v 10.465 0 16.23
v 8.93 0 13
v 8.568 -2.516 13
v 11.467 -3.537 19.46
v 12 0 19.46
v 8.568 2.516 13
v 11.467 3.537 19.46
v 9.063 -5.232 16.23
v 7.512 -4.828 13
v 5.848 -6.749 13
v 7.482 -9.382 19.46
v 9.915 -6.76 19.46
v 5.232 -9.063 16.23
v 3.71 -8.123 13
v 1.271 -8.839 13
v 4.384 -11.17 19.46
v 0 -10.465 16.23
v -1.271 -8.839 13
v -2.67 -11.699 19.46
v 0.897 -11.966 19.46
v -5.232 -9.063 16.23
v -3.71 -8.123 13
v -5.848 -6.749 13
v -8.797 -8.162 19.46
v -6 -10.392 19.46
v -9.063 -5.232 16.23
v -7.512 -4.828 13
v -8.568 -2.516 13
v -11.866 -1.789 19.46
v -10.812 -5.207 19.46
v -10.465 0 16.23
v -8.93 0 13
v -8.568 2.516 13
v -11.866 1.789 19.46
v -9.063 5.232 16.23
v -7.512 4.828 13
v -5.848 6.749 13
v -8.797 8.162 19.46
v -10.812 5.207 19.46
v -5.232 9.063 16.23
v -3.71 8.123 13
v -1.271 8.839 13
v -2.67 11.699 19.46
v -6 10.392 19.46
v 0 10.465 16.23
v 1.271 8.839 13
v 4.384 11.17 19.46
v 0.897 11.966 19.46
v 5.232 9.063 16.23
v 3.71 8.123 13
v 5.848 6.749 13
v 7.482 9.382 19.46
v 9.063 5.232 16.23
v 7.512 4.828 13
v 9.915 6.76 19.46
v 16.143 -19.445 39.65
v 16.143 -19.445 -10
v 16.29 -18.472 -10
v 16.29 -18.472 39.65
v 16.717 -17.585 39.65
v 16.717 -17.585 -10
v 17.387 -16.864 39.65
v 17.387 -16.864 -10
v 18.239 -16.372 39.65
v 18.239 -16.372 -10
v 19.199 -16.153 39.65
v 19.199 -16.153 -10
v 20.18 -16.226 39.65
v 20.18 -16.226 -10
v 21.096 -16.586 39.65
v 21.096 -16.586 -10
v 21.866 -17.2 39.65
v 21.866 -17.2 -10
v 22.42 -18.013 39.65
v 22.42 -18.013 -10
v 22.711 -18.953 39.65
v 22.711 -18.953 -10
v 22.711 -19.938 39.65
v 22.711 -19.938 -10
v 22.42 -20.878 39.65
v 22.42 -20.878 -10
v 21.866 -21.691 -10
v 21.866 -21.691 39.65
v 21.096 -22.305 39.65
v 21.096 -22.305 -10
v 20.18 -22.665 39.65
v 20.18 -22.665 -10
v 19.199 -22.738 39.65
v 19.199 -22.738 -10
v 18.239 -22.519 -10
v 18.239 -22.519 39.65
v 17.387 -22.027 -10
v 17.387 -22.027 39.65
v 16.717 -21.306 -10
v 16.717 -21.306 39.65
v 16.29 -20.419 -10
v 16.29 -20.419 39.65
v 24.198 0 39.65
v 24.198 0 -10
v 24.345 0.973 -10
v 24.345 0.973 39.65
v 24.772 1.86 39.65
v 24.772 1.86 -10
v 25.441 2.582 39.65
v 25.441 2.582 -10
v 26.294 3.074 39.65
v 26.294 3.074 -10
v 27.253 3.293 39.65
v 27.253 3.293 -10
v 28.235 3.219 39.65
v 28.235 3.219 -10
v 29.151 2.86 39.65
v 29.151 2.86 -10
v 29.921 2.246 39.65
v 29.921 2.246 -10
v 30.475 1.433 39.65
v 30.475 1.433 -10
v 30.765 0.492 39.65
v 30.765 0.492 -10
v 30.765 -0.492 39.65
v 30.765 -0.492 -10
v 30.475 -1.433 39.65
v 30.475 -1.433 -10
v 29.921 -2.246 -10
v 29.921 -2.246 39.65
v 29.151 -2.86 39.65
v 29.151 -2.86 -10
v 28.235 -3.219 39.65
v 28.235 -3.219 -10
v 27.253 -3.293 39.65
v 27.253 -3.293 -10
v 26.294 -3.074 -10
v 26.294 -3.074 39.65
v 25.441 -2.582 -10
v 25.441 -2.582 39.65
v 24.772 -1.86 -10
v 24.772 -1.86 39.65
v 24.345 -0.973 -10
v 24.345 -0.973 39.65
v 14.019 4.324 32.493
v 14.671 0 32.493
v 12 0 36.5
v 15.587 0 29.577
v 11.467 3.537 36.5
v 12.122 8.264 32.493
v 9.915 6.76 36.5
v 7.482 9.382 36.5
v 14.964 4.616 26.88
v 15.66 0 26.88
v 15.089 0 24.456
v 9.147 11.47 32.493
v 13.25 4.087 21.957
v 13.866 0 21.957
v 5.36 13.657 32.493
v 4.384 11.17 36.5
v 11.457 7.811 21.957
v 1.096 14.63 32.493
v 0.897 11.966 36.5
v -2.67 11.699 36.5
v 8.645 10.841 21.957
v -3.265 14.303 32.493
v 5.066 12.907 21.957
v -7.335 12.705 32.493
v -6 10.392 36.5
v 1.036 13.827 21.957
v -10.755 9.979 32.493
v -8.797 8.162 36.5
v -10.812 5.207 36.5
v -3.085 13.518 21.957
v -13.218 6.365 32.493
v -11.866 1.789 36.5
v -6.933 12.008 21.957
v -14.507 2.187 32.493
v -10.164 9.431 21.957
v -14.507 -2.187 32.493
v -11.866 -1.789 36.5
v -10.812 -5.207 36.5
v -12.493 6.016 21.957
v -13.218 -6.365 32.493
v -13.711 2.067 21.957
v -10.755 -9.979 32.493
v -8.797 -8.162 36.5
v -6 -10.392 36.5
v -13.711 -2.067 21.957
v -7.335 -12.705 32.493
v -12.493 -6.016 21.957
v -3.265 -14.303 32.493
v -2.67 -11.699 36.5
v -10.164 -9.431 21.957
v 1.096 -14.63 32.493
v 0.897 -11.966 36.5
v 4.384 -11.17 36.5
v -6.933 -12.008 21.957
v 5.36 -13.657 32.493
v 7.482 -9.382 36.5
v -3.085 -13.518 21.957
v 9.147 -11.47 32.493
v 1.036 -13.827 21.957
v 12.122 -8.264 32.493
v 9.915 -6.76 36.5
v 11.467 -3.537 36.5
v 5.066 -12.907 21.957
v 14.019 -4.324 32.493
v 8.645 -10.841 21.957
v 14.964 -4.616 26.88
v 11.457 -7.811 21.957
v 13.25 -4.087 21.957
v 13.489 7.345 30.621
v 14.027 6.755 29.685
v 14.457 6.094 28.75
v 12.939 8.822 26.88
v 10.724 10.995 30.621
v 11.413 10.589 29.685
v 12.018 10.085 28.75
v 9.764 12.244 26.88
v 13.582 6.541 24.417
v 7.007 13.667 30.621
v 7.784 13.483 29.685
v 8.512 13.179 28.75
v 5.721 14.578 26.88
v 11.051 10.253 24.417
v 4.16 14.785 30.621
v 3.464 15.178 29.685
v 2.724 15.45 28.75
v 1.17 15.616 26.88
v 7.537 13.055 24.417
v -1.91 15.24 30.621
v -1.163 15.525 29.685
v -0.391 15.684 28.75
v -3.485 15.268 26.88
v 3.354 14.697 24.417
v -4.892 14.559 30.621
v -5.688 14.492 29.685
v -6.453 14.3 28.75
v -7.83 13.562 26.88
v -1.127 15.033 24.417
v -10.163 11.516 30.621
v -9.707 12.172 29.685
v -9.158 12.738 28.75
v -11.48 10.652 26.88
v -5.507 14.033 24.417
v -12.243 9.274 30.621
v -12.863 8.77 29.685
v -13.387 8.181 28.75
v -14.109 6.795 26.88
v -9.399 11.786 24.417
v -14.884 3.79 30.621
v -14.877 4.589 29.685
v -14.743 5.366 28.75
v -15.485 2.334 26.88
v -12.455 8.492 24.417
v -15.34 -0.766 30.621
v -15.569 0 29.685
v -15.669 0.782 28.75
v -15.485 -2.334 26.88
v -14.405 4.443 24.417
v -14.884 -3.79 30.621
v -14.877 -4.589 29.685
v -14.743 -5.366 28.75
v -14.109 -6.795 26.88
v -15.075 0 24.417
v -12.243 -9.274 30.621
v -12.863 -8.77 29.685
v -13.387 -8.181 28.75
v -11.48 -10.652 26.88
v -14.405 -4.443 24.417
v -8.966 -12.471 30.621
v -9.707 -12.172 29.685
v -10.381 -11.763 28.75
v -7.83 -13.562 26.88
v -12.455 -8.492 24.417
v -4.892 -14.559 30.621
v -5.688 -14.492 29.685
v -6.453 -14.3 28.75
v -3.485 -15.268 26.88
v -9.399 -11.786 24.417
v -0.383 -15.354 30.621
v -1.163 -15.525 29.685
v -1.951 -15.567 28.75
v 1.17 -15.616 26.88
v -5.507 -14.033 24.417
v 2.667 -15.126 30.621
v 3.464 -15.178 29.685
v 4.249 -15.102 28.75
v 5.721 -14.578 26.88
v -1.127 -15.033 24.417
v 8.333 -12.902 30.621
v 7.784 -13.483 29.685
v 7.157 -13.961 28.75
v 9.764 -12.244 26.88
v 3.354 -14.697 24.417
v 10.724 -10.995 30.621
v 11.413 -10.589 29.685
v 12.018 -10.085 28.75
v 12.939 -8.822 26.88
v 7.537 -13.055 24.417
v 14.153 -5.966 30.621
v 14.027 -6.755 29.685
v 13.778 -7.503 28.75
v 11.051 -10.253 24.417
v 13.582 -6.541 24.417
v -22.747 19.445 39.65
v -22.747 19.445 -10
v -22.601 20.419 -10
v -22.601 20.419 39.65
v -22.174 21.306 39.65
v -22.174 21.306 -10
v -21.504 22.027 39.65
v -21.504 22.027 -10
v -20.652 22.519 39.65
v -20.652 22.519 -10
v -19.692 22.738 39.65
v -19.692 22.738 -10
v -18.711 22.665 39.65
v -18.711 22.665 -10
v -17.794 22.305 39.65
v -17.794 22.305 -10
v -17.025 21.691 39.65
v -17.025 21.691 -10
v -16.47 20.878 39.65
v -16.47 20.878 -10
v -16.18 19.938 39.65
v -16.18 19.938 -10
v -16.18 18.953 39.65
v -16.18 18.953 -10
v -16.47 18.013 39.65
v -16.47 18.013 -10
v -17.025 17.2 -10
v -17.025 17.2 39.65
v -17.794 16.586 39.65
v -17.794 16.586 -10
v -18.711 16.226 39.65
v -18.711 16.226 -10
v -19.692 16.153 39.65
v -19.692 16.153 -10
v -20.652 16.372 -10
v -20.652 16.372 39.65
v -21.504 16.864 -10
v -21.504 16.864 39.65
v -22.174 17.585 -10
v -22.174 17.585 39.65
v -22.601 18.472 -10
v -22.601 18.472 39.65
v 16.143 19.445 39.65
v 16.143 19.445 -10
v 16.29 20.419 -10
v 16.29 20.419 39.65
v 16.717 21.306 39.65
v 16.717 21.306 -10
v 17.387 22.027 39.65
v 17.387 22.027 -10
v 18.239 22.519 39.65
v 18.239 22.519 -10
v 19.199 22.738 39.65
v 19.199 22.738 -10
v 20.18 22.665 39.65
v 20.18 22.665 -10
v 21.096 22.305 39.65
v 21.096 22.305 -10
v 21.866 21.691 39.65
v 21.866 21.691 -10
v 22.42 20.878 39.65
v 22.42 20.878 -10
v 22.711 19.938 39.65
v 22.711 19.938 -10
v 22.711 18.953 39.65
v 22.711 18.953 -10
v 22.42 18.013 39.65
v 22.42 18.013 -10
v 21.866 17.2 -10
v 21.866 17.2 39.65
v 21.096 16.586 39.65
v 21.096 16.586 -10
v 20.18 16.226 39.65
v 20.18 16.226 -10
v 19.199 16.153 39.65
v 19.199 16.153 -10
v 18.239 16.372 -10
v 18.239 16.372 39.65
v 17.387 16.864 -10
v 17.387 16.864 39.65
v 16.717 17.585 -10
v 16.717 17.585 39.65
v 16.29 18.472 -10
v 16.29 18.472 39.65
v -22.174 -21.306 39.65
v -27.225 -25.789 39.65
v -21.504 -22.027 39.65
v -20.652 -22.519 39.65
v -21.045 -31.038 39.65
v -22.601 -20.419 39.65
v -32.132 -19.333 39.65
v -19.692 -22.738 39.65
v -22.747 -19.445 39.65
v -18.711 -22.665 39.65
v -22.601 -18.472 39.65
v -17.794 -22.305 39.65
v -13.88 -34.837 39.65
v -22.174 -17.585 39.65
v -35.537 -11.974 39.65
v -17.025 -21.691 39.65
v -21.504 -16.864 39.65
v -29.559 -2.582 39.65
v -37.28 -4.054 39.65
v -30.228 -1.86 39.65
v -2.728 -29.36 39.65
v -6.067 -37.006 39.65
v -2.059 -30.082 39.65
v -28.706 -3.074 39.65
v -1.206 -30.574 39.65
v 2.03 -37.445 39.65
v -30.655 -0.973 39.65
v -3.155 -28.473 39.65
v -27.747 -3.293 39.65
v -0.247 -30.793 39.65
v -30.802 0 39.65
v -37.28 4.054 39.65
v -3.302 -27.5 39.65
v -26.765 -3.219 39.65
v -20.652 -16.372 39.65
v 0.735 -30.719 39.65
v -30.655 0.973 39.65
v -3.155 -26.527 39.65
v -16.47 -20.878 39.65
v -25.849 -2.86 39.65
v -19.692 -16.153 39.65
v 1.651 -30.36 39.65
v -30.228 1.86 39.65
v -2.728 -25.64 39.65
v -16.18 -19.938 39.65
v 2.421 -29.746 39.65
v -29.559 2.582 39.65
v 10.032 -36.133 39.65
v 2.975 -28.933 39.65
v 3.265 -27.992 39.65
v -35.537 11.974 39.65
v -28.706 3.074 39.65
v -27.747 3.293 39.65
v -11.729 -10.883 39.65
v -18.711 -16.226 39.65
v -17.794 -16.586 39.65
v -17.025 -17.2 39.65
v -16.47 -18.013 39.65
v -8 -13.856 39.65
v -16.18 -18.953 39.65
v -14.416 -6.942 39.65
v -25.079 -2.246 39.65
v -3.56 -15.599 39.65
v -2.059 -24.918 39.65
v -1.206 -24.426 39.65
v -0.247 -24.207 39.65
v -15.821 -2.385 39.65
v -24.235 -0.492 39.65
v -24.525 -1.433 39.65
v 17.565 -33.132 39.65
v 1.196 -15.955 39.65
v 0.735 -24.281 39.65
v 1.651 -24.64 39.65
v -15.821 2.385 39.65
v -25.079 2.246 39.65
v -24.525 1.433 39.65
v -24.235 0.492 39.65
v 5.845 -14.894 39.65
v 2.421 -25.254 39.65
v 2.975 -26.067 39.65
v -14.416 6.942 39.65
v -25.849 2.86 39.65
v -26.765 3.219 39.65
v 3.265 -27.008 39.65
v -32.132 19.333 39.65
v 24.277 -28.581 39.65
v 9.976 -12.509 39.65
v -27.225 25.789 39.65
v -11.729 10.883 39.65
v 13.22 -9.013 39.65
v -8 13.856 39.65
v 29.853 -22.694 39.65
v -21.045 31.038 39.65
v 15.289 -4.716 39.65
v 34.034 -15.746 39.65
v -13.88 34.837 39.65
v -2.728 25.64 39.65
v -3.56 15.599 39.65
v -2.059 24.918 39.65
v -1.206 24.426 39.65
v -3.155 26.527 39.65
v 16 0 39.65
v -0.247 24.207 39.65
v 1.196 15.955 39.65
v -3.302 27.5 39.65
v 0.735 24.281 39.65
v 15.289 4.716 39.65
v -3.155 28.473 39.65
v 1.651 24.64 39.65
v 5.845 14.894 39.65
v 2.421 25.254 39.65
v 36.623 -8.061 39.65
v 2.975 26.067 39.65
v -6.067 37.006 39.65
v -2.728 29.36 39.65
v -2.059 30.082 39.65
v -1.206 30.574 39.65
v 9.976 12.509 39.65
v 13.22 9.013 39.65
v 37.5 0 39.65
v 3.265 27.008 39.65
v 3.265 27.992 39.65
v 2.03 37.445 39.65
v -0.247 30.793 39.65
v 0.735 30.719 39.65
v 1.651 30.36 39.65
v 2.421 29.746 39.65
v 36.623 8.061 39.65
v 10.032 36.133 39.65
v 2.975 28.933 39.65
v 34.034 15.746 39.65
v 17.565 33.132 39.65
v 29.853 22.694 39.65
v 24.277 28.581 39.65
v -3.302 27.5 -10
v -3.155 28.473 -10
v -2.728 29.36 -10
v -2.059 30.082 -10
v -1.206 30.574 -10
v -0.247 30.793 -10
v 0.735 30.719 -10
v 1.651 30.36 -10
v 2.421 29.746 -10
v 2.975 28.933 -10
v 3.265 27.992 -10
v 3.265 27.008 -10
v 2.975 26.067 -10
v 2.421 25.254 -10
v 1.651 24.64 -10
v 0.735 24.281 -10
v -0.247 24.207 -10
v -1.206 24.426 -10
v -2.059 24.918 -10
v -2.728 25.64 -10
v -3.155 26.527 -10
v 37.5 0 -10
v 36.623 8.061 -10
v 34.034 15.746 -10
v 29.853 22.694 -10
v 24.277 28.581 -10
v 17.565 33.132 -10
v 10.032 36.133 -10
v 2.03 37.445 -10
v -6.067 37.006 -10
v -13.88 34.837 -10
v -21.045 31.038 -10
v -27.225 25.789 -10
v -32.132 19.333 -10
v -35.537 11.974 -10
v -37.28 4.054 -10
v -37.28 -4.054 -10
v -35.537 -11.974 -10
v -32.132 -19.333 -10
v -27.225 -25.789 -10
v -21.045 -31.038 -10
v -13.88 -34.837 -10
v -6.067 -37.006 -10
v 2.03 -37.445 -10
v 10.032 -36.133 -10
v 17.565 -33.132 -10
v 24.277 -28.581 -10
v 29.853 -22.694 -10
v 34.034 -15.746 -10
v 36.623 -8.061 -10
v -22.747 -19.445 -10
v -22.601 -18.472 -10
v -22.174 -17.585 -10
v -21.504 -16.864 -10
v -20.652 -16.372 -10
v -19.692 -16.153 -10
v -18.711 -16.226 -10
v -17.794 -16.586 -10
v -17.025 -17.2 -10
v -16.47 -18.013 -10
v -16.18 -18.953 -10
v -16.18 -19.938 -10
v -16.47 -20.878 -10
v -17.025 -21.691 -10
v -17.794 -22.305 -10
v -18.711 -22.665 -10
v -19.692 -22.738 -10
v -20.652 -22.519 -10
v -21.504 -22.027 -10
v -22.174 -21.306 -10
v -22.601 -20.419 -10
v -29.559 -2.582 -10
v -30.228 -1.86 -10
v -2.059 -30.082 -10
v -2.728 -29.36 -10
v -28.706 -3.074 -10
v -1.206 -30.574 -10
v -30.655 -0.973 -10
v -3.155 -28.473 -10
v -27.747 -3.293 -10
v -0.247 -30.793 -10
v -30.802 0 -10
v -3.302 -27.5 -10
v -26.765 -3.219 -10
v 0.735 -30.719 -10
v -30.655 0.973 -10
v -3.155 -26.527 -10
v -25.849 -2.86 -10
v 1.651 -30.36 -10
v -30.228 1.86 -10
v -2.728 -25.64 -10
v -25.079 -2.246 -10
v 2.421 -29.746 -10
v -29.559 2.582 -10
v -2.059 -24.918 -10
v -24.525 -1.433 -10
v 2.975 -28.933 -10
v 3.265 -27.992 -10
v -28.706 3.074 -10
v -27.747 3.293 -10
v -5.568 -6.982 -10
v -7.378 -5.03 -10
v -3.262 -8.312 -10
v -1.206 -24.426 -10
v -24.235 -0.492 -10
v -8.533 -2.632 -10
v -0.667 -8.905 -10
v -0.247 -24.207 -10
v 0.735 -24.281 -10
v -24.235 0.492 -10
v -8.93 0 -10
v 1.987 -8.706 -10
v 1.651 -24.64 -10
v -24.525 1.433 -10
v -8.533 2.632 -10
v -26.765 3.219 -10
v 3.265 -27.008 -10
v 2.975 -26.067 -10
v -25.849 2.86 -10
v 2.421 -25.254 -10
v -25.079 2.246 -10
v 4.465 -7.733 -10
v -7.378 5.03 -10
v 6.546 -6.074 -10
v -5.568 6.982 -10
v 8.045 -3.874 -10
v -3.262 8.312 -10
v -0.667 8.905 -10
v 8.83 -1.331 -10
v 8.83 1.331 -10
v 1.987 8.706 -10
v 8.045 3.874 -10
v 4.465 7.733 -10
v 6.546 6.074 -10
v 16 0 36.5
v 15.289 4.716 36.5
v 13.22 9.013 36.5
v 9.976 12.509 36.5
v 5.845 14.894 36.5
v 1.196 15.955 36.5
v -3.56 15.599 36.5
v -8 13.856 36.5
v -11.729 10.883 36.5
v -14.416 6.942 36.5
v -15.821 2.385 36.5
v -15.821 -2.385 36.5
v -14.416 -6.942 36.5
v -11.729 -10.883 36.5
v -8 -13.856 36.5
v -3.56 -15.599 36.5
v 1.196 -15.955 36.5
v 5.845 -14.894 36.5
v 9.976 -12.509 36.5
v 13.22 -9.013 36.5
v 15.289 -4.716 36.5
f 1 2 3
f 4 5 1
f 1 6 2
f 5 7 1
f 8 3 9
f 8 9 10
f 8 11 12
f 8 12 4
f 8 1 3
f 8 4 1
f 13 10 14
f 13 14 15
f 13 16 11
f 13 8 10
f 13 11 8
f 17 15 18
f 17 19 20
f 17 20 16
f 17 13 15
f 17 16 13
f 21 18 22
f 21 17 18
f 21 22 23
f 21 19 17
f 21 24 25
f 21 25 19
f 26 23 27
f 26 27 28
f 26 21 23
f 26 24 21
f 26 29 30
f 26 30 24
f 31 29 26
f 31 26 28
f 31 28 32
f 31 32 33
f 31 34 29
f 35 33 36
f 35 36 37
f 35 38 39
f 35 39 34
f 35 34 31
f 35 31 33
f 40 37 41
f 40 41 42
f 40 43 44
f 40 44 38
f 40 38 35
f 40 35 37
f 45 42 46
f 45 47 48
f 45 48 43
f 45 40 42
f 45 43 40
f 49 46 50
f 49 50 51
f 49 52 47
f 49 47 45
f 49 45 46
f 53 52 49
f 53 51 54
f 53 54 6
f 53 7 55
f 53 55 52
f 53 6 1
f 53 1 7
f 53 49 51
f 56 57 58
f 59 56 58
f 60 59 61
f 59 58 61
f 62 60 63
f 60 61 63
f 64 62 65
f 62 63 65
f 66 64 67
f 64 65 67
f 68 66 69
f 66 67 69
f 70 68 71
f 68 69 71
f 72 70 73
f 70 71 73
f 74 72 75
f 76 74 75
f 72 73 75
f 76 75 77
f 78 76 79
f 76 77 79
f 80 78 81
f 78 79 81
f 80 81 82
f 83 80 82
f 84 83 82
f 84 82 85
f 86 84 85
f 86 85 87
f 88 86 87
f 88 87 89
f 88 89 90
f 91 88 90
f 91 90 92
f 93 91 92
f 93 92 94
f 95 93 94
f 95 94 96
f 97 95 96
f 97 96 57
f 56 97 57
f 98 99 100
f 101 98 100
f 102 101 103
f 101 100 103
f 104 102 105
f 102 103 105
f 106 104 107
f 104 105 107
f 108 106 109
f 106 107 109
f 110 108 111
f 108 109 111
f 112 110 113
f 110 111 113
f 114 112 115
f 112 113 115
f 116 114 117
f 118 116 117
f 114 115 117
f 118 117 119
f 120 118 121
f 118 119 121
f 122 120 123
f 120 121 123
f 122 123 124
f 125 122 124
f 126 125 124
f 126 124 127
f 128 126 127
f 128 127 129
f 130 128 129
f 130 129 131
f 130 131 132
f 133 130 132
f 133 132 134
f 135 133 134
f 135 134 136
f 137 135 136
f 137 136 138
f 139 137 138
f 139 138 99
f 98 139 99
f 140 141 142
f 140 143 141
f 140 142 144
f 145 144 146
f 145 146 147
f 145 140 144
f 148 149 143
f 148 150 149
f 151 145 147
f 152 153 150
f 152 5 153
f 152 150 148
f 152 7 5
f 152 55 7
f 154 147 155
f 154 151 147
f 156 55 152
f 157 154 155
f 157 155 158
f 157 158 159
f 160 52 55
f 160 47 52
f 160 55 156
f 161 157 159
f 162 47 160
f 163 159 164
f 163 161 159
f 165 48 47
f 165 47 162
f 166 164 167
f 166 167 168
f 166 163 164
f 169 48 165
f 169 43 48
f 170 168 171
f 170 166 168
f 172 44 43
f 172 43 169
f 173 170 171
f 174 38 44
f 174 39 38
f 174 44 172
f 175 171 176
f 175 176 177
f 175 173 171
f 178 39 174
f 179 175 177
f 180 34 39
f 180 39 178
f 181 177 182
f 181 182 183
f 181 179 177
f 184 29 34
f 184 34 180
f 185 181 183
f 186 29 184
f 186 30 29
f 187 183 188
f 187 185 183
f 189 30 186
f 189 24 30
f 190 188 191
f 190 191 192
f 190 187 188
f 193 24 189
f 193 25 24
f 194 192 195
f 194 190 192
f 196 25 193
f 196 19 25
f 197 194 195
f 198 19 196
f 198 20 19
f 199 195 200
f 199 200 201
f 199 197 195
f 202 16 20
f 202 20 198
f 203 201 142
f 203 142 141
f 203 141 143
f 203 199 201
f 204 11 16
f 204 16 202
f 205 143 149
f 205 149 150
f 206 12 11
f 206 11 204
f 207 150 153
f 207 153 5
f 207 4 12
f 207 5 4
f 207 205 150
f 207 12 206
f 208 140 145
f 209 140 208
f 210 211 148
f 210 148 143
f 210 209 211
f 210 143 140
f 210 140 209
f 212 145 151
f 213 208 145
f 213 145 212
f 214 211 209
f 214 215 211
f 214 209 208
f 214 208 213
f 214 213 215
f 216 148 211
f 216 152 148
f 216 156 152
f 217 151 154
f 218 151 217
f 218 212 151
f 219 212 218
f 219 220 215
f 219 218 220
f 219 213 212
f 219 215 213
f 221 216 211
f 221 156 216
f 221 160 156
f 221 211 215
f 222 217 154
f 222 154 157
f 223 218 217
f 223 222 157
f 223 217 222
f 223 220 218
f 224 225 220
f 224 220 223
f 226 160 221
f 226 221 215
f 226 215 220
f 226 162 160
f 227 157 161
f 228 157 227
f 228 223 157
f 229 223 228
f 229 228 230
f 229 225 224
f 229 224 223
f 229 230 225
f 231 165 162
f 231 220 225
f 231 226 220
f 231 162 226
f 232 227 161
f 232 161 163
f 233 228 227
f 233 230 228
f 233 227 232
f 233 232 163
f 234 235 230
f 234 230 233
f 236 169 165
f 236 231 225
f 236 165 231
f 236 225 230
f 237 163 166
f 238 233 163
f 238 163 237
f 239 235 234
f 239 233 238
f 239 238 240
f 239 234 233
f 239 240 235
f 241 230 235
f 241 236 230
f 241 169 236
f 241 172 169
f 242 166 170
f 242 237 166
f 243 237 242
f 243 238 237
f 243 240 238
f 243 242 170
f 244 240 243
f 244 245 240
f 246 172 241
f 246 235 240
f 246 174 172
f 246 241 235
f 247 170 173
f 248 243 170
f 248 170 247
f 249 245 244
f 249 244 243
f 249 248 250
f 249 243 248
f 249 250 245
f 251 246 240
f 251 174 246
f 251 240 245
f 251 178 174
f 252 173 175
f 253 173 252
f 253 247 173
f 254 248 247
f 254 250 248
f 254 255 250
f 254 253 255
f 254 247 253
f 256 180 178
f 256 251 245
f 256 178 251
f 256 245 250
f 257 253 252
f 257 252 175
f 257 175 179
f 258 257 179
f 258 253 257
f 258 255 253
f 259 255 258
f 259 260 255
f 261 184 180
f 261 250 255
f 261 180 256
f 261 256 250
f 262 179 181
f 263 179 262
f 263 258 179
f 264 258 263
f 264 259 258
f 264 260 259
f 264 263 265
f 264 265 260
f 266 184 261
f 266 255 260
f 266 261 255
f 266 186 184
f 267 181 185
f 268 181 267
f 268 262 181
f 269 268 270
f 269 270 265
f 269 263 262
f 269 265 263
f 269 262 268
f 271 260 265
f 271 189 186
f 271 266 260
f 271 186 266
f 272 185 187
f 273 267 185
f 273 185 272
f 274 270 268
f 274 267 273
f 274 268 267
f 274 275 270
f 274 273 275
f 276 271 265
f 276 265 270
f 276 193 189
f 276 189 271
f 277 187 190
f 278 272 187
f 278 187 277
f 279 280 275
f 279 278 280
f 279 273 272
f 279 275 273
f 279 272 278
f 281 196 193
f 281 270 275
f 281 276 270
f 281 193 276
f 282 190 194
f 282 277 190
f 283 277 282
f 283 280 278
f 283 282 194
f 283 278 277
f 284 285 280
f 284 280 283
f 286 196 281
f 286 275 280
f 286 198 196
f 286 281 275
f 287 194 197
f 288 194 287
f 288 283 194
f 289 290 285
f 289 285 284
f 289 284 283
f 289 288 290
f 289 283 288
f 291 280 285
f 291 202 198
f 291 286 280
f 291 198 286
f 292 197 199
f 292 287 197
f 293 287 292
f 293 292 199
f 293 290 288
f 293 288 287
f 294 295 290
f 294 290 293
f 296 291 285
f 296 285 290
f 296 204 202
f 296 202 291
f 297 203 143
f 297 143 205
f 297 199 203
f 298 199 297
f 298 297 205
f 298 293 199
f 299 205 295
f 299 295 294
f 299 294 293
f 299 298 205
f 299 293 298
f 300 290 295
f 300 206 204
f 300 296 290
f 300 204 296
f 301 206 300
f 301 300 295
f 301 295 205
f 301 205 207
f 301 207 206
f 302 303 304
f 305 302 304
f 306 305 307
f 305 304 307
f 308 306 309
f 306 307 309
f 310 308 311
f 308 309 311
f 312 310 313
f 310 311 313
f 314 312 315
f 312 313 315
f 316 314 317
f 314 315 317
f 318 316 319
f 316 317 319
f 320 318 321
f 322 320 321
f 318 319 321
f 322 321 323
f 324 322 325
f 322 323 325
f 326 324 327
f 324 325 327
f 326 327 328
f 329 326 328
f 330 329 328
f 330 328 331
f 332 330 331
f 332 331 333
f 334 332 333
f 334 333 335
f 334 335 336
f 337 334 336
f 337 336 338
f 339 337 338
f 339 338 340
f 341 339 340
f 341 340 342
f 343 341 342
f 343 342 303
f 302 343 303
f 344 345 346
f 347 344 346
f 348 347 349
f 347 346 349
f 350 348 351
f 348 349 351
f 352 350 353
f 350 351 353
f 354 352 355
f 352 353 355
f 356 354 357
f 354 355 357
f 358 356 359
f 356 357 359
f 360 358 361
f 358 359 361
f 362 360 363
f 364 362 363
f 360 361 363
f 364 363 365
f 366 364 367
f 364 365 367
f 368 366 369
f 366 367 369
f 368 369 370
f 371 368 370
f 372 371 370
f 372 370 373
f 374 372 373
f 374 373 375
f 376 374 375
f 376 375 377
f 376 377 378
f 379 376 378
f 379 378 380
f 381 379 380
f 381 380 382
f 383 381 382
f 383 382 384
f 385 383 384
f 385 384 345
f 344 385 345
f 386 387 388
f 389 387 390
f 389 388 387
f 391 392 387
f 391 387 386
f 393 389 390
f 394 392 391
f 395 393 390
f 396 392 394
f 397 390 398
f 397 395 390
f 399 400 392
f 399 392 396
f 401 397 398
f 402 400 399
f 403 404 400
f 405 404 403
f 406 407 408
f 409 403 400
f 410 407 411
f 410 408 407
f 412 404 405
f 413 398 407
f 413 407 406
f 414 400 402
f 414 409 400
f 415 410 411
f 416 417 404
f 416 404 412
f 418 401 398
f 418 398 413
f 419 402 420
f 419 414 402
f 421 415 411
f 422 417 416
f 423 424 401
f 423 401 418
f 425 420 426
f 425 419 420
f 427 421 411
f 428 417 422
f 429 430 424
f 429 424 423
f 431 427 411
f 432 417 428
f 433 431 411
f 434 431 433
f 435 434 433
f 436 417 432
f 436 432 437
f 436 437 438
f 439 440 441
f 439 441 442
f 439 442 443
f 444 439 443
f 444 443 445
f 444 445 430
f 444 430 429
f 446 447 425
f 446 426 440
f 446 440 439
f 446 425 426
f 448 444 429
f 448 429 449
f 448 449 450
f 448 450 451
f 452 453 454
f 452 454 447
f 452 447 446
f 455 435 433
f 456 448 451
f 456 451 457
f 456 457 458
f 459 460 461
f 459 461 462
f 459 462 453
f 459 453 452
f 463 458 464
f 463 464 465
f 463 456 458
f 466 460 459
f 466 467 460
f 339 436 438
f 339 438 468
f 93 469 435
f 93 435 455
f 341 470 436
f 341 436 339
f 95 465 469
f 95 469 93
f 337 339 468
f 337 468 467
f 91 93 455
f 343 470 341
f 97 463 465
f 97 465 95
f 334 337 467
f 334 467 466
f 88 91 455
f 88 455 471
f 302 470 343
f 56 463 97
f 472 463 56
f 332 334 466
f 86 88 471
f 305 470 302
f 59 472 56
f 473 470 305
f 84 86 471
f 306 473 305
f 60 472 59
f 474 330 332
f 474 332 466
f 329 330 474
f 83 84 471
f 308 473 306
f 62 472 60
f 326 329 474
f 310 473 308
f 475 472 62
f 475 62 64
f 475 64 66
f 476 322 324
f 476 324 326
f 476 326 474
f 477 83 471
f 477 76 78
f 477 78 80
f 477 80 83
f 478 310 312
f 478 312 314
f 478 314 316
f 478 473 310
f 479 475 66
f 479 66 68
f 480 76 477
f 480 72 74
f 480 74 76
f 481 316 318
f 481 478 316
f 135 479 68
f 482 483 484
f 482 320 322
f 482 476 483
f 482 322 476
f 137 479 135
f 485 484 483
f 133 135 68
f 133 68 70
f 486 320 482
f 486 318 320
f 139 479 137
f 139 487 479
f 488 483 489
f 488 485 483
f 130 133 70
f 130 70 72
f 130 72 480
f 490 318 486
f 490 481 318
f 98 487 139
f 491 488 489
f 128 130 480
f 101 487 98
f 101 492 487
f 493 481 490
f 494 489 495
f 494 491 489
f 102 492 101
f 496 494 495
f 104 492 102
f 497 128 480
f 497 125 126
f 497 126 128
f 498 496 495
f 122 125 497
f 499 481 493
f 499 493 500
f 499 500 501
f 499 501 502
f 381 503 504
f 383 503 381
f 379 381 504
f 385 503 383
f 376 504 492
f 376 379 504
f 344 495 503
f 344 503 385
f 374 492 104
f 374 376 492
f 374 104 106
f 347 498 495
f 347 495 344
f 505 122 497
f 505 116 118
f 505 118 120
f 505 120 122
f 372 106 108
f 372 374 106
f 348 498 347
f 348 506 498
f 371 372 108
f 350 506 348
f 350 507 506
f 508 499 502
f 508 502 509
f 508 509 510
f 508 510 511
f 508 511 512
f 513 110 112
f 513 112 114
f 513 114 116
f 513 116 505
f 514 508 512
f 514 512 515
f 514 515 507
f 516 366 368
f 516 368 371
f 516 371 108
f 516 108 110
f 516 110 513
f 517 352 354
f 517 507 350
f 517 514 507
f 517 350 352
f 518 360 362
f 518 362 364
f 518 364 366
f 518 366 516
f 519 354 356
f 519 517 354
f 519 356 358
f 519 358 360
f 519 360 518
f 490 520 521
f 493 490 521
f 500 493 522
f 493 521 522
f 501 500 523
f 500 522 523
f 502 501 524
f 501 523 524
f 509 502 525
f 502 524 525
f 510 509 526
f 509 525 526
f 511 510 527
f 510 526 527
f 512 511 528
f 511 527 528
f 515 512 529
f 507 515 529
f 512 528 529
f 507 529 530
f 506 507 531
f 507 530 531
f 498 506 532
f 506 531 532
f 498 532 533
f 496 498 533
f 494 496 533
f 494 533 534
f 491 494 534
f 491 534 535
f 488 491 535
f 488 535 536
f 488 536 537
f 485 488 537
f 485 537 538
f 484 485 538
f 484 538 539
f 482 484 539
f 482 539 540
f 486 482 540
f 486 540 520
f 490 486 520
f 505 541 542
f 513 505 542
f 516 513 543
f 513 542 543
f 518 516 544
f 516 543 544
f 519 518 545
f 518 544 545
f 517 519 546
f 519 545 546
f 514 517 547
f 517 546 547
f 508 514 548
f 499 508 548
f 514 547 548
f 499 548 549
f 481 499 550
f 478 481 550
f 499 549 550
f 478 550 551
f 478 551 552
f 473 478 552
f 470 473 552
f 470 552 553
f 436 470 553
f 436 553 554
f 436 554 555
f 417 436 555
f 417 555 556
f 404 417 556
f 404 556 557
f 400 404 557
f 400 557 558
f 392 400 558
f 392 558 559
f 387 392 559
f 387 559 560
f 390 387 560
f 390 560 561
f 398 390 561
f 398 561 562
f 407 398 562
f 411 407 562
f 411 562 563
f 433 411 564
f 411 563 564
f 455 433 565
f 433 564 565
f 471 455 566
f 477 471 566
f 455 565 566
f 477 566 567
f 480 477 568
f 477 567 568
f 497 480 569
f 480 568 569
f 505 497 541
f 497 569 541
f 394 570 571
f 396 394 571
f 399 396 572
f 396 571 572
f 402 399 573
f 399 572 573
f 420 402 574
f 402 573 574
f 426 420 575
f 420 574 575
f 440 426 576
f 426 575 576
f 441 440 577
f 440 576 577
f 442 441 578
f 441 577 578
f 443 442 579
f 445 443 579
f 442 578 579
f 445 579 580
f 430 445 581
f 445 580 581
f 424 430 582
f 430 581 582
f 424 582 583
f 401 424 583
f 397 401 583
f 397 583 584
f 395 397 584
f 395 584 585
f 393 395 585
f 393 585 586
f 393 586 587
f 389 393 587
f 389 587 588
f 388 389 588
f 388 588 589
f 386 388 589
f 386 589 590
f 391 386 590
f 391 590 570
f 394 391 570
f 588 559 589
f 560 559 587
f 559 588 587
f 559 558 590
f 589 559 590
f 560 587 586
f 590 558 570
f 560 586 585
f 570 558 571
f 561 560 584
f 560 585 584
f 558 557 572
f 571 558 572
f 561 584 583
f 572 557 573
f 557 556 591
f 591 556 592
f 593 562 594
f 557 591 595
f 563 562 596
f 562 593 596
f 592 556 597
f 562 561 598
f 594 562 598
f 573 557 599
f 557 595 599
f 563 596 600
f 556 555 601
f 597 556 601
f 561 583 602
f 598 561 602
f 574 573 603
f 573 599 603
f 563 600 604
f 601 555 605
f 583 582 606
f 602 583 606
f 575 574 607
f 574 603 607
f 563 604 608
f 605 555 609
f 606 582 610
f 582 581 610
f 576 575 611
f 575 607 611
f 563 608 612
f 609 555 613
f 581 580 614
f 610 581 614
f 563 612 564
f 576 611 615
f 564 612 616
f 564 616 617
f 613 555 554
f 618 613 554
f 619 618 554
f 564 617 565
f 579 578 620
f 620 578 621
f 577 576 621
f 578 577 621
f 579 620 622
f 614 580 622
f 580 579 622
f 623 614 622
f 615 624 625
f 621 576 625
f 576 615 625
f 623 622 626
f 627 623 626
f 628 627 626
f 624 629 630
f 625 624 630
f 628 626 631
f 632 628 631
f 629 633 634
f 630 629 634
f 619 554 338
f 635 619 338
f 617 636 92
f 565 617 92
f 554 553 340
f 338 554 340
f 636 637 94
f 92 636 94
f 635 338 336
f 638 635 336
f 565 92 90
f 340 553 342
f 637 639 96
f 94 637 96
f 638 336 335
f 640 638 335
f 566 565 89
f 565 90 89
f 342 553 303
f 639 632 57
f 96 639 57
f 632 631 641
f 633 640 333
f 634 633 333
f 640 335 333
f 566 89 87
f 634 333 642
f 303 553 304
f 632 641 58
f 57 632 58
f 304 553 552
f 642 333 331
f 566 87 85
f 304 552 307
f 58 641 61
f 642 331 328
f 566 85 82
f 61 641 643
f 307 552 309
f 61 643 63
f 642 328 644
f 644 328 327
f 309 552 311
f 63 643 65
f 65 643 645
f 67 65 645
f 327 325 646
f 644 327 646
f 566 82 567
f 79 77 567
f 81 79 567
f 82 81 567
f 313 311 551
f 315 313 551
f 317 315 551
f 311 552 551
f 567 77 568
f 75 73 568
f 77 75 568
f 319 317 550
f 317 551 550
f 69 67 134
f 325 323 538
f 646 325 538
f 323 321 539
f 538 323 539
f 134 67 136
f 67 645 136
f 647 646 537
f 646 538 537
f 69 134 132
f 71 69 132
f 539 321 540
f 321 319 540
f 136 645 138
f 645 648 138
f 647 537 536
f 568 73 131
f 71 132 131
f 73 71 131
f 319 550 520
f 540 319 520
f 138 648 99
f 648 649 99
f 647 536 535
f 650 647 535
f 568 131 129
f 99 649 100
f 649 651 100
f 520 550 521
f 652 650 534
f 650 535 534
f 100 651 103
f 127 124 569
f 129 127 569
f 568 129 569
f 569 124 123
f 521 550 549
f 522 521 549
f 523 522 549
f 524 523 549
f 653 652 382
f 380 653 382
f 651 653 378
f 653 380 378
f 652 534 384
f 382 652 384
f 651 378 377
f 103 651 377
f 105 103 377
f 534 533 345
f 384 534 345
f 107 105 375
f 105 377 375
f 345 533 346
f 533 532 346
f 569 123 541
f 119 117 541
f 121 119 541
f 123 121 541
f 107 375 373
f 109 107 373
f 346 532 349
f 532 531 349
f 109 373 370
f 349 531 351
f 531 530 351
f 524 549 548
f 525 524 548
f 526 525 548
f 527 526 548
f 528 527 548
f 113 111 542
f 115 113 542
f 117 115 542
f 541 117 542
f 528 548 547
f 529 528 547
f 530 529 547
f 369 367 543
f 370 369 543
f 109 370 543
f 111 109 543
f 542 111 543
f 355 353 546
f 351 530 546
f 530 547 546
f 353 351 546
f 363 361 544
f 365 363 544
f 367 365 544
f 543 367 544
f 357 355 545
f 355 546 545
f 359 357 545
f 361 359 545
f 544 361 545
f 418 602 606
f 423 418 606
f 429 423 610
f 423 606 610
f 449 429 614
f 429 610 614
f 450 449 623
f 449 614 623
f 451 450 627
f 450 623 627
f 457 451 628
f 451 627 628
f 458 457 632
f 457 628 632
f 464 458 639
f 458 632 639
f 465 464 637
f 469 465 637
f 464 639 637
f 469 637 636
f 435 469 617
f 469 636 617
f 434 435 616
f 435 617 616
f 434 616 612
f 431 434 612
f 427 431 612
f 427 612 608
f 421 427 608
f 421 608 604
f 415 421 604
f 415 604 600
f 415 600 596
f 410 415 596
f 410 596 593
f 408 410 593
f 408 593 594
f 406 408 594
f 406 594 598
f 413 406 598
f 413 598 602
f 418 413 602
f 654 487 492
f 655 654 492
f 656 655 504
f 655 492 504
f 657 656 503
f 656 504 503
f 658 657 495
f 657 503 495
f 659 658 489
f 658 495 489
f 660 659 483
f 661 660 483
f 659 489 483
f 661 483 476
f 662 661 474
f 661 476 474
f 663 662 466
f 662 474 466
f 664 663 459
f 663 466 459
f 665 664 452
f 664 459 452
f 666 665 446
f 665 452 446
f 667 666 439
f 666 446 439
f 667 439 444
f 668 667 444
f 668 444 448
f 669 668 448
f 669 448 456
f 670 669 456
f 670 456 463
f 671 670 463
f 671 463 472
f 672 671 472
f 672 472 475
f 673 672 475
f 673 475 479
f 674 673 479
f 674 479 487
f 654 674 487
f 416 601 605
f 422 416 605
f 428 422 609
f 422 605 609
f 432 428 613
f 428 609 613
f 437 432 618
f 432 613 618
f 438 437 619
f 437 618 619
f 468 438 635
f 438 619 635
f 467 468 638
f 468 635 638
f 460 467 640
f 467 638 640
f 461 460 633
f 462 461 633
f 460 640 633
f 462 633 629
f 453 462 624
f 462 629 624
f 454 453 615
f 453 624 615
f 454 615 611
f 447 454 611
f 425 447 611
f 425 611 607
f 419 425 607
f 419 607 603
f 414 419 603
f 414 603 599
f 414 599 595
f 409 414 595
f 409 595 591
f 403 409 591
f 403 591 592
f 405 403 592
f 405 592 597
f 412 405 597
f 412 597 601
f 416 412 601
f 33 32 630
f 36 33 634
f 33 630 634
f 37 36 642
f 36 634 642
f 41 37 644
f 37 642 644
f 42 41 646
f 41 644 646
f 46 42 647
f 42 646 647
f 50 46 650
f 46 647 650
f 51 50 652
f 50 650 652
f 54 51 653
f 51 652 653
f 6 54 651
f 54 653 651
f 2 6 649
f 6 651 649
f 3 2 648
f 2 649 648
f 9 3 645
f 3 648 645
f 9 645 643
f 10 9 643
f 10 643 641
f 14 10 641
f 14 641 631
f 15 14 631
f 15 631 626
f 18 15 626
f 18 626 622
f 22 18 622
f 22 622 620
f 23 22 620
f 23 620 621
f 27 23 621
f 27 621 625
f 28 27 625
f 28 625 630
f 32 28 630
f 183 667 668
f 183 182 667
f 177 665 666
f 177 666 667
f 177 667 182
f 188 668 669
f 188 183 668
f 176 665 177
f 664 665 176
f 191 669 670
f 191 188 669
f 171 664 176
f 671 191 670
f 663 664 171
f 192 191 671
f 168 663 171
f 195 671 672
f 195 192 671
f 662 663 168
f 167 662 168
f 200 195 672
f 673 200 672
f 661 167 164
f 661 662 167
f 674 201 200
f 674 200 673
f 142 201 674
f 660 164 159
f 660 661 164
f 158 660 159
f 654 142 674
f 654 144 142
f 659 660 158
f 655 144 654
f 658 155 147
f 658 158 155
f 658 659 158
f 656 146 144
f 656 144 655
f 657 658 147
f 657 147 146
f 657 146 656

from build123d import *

# Parameters (mm, degrees)
BOSS_EXTRUDE1_DEPTH      = 55
BOSS_EXTRUDE1_DEPTH_BACK = 10
SKETCH1_R                = 37.5
SKETCH2_R                = 16
CUT_EXTRUDE1_DEPTH       = 16
SKETCH3_R                = 16
CUT_EXTRUDE2_DEPTH       = 2.5
SKETCH6_R                = 8.9296875
CUT_EXTRUDE3_DEPTH       = 23
SKETCH7_R                = 37.5
CUT_EXTRUDE4_DEPTH       = 15.35
SKETCH9_R                = 3.302
BOLT_HOLES_DEPTH         = 73.647247023


with BuildPart() as part:
    # Sketch1 → Boss-Extrude1 (new, two sides: drawn at the far end of the back side and taken through both)
    with BuildSketch(Plane.XY.offset(-BOSS_EXTRUDE1_DEPTH_BACK)):
        Circle(SKETCH1_R)
    extrude(amount=BOSS_EXTRUDE1_DEPTH + BOSS_EXTRUDE1_DEPTH_BACK)

    # Sketch2 → Cut-Extrude1 (cut)
    with BuildSketch(Plane.XY.offset(55)):
        Circle(SKETCH2_R)
    extrude(amount=-CUT_EXTRUDE1_DEPTH, mode=Mode.SUBTRACT)

    # Sketch3 → Cut-Extrude2 (cut)
    with BuildSketch(Plane.XY.offset(39)):
        Circle(SKETCH3_R)
    extrude(amount=-CUT_EXTRUDE2_DEPTH, mode=Mode.SUBTRACT)

    # Sketch4 → Aortic Root (revolve, cut)
    with BuildSketch(Plane(origin=(0, 0, 0), x_dir=(0, 0, -1), z_dir=(1, 0, 0)), mode=Mode.PRIVATE) as aortic_root_sk:
        with BuildLine():
            Line((-19.46, 12), (-19.46, 0))
            Line((-19.46, 0), (-36.5, 0))
            Line((-36.5, 0), (-36.5, 12))
            add(Edge.make_bspline(
                [(-36.5, 12), (-27.947018525, 19.440766671), (-19.46, 12)],
                knots=[0, 0, 0, 1, 1, 1], degree=2))
        make_face()
    revolve(aortic_root_sk.sketch.rotate(Axis((0, 0, 19.46), (0, 0, 1)), 270), axis=Axis((0, 0, 19.46), (0, 0, 1)), mode=Mode.SUBTRACT)

    # Sketch6 → Cut-Extrude3 (cut)
    with BuildSketch(Plane(origin=(0, 0, -10), x_dir=(-1, 0, 0), z_dir=(0, 0, -1))):
        Circle(SKETCH6_R)
    extrude(amount=-CUT_EXTRUDE3_DEPTH, mode=Mode.SUBTRACT)

    # Sketch7 → Cut-Extrude4 (cut)
    with BuildSketch(Plane.XY.offset(55)):
        Circle(SKETCH7_R)
    extrude(amount=-CUT_EXTRUDE4_DEPTH, mode=Mode.SUBTRACT)

    # Sketch9 → Bolt holes (cut, through all)
    with BuildSketch(Plane(origin=(0, 0, -10), x_dir=(-1, 0, 0), z_dir=(0, 0, -1))):
        with Locations((0, -27.5)):
            Circle(SKETCH9_R)
        with Locations((-19.445436483, -19.445436483)):
            Circle(SKETCH9_R)
        with Locations((-27.5, 0)):
            Circle(SKETCH9_R)
        with Locations((-19.445436483, 19.445436483)):
            Circle(SKETCH9_R)
        with Locations((0, 27.5)):
            Circle(SKETCH9_R)
        with Locations((19.445436483, 19.445436483)):
            Circle(SKETCH9_R)
        with Locations((27.5, 0)):
            Circle(SKETCH9_R)
        with Locations((19.445436483, -19.445436483)):
            Circle(SKETCH9_R)
    extrude(amount=-BOLT_HOLES_DEPTH, mode=Mode.SUBTRACT)

    # Sketch12 → Cut-Revolve1 (revolve, cut)
    with BuildSketch(Plane(origin=(0, 0, 0), x_dir=(1, 0, 0), z_dir=(0, 1, 0))):
        Polygon((0, -19.46), (0, -13), (8.9296875, -13), (12, -19.46), align=None)
    revolve(axis=Axis((0, 0, 19.46), (0, 0, -1)), mode=Mode.SUBTRACT)


solid = part.part
